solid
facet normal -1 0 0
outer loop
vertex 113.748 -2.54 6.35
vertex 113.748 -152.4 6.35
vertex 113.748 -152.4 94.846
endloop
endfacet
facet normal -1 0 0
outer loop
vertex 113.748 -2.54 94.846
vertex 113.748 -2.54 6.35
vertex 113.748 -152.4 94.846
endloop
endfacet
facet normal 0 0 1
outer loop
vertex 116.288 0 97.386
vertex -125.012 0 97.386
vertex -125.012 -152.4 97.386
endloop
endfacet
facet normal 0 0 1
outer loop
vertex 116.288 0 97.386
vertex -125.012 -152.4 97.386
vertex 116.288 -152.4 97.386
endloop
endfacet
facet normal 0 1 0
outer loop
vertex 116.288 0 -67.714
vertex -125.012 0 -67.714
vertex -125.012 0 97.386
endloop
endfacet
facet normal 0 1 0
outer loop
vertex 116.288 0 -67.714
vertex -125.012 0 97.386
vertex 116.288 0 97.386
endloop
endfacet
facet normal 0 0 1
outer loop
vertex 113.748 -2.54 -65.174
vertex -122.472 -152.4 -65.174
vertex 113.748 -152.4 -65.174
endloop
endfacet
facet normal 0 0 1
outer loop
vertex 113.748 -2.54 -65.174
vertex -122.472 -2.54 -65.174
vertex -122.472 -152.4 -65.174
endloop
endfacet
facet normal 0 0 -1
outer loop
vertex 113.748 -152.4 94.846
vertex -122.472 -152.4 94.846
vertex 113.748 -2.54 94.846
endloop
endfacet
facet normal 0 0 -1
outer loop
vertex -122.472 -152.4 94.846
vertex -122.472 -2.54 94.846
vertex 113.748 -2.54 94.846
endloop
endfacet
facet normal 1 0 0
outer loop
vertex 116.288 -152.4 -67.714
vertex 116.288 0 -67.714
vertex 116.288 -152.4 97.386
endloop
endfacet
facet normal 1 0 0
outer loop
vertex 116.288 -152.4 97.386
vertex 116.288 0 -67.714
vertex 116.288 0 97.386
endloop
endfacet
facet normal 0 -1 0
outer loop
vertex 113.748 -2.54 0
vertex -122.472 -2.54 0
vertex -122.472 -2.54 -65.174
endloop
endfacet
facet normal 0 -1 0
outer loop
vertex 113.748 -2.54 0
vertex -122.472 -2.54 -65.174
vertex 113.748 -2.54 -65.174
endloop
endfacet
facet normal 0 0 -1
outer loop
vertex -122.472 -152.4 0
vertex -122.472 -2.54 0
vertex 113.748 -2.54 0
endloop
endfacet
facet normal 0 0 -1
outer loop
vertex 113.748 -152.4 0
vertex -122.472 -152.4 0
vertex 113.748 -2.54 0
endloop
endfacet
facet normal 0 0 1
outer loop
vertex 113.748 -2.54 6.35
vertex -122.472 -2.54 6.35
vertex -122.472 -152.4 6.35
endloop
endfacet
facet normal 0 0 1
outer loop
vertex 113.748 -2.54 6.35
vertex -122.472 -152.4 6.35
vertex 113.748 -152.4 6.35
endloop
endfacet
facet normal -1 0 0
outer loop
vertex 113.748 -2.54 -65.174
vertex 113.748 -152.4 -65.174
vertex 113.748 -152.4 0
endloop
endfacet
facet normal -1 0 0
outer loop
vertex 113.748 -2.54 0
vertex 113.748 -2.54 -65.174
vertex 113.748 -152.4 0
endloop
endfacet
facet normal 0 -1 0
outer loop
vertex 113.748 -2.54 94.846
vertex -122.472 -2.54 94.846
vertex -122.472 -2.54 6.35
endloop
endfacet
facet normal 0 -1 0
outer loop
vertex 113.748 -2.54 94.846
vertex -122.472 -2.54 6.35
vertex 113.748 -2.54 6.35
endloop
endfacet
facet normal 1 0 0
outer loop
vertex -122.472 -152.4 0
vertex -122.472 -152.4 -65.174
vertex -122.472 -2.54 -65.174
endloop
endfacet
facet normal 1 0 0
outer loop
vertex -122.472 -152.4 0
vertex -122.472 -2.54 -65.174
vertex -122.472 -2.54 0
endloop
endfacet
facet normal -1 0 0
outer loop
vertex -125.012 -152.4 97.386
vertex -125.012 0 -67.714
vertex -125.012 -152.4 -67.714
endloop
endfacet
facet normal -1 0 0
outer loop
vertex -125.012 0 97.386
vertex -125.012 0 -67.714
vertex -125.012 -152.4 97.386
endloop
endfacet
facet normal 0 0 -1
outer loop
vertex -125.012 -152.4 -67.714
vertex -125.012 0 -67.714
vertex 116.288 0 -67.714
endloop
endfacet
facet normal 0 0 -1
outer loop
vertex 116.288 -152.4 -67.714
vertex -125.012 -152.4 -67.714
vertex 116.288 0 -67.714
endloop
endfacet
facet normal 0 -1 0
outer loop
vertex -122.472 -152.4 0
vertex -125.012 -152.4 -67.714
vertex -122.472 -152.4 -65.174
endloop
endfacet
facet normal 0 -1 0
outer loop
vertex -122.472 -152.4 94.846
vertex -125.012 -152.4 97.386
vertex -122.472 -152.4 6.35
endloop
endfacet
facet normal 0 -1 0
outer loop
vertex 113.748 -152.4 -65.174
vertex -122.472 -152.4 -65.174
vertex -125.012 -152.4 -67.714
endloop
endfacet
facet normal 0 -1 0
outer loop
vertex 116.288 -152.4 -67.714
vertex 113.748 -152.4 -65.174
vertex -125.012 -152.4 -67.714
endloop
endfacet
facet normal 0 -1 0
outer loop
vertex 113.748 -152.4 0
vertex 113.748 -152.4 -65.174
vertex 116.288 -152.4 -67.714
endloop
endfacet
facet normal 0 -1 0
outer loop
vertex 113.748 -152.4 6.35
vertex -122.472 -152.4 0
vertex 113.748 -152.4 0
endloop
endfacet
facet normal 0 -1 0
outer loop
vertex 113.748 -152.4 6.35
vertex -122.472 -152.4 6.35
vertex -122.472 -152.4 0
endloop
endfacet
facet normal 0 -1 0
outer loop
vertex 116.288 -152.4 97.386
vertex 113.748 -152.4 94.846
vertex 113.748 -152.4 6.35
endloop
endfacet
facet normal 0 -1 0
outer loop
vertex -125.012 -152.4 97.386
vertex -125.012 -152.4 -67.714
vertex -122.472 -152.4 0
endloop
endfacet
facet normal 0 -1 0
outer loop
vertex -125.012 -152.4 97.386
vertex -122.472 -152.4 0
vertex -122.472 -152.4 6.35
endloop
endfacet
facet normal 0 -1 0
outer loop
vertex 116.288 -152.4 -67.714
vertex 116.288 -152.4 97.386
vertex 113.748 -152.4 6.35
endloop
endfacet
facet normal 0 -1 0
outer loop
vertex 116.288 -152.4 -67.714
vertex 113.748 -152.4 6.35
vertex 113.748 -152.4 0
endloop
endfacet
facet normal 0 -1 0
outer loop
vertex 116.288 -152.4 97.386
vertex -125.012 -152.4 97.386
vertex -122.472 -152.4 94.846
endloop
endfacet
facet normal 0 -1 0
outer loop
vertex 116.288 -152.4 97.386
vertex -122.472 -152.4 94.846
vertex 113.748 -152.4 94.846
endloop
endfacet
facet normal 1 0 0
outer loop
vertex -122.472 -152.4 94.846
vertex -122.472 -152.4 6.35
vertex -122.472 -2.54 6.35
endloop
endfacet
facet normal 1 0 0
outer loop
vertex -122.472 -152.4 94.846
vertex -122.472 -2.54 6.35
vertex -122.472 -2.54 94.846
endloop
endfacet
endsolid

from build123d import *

# Parameters (mm, degrees)
F0_W     = 241.3
F0_H     = 165.1
F1_DEPTH = 152.4
F2_T     = -2.54
F3_W     = 237.49
F3_H     = 152.4
F4_DEPTH = 6.35


with BuildPart() as f1:
    # F0 (on Front) → F1 (new body)
    with BuildSketch(Plane.XZ):
        with Locations((-4.36151, 14.835821)):
            Rectangle(F0_W, F0_H)
    extrude(amount=F1_DEPTH)

    # F2
    f2_openings = [f1.faces().sort_by_distance(p)[0] for p in [
        (-4.36151, -152.4, 14.835821),
    ]]
    offset(amount=F2_T, openings=f2_openings)

    # F3 (on Top) → F4 (join)
    with BuildSketch(Plane.XY):
        with Locations((-4.821002, -76.2)):
            Rectangle(F3_W, F3_H)
    extrude(amount=F4_DEPTH)


solid = f1.part
